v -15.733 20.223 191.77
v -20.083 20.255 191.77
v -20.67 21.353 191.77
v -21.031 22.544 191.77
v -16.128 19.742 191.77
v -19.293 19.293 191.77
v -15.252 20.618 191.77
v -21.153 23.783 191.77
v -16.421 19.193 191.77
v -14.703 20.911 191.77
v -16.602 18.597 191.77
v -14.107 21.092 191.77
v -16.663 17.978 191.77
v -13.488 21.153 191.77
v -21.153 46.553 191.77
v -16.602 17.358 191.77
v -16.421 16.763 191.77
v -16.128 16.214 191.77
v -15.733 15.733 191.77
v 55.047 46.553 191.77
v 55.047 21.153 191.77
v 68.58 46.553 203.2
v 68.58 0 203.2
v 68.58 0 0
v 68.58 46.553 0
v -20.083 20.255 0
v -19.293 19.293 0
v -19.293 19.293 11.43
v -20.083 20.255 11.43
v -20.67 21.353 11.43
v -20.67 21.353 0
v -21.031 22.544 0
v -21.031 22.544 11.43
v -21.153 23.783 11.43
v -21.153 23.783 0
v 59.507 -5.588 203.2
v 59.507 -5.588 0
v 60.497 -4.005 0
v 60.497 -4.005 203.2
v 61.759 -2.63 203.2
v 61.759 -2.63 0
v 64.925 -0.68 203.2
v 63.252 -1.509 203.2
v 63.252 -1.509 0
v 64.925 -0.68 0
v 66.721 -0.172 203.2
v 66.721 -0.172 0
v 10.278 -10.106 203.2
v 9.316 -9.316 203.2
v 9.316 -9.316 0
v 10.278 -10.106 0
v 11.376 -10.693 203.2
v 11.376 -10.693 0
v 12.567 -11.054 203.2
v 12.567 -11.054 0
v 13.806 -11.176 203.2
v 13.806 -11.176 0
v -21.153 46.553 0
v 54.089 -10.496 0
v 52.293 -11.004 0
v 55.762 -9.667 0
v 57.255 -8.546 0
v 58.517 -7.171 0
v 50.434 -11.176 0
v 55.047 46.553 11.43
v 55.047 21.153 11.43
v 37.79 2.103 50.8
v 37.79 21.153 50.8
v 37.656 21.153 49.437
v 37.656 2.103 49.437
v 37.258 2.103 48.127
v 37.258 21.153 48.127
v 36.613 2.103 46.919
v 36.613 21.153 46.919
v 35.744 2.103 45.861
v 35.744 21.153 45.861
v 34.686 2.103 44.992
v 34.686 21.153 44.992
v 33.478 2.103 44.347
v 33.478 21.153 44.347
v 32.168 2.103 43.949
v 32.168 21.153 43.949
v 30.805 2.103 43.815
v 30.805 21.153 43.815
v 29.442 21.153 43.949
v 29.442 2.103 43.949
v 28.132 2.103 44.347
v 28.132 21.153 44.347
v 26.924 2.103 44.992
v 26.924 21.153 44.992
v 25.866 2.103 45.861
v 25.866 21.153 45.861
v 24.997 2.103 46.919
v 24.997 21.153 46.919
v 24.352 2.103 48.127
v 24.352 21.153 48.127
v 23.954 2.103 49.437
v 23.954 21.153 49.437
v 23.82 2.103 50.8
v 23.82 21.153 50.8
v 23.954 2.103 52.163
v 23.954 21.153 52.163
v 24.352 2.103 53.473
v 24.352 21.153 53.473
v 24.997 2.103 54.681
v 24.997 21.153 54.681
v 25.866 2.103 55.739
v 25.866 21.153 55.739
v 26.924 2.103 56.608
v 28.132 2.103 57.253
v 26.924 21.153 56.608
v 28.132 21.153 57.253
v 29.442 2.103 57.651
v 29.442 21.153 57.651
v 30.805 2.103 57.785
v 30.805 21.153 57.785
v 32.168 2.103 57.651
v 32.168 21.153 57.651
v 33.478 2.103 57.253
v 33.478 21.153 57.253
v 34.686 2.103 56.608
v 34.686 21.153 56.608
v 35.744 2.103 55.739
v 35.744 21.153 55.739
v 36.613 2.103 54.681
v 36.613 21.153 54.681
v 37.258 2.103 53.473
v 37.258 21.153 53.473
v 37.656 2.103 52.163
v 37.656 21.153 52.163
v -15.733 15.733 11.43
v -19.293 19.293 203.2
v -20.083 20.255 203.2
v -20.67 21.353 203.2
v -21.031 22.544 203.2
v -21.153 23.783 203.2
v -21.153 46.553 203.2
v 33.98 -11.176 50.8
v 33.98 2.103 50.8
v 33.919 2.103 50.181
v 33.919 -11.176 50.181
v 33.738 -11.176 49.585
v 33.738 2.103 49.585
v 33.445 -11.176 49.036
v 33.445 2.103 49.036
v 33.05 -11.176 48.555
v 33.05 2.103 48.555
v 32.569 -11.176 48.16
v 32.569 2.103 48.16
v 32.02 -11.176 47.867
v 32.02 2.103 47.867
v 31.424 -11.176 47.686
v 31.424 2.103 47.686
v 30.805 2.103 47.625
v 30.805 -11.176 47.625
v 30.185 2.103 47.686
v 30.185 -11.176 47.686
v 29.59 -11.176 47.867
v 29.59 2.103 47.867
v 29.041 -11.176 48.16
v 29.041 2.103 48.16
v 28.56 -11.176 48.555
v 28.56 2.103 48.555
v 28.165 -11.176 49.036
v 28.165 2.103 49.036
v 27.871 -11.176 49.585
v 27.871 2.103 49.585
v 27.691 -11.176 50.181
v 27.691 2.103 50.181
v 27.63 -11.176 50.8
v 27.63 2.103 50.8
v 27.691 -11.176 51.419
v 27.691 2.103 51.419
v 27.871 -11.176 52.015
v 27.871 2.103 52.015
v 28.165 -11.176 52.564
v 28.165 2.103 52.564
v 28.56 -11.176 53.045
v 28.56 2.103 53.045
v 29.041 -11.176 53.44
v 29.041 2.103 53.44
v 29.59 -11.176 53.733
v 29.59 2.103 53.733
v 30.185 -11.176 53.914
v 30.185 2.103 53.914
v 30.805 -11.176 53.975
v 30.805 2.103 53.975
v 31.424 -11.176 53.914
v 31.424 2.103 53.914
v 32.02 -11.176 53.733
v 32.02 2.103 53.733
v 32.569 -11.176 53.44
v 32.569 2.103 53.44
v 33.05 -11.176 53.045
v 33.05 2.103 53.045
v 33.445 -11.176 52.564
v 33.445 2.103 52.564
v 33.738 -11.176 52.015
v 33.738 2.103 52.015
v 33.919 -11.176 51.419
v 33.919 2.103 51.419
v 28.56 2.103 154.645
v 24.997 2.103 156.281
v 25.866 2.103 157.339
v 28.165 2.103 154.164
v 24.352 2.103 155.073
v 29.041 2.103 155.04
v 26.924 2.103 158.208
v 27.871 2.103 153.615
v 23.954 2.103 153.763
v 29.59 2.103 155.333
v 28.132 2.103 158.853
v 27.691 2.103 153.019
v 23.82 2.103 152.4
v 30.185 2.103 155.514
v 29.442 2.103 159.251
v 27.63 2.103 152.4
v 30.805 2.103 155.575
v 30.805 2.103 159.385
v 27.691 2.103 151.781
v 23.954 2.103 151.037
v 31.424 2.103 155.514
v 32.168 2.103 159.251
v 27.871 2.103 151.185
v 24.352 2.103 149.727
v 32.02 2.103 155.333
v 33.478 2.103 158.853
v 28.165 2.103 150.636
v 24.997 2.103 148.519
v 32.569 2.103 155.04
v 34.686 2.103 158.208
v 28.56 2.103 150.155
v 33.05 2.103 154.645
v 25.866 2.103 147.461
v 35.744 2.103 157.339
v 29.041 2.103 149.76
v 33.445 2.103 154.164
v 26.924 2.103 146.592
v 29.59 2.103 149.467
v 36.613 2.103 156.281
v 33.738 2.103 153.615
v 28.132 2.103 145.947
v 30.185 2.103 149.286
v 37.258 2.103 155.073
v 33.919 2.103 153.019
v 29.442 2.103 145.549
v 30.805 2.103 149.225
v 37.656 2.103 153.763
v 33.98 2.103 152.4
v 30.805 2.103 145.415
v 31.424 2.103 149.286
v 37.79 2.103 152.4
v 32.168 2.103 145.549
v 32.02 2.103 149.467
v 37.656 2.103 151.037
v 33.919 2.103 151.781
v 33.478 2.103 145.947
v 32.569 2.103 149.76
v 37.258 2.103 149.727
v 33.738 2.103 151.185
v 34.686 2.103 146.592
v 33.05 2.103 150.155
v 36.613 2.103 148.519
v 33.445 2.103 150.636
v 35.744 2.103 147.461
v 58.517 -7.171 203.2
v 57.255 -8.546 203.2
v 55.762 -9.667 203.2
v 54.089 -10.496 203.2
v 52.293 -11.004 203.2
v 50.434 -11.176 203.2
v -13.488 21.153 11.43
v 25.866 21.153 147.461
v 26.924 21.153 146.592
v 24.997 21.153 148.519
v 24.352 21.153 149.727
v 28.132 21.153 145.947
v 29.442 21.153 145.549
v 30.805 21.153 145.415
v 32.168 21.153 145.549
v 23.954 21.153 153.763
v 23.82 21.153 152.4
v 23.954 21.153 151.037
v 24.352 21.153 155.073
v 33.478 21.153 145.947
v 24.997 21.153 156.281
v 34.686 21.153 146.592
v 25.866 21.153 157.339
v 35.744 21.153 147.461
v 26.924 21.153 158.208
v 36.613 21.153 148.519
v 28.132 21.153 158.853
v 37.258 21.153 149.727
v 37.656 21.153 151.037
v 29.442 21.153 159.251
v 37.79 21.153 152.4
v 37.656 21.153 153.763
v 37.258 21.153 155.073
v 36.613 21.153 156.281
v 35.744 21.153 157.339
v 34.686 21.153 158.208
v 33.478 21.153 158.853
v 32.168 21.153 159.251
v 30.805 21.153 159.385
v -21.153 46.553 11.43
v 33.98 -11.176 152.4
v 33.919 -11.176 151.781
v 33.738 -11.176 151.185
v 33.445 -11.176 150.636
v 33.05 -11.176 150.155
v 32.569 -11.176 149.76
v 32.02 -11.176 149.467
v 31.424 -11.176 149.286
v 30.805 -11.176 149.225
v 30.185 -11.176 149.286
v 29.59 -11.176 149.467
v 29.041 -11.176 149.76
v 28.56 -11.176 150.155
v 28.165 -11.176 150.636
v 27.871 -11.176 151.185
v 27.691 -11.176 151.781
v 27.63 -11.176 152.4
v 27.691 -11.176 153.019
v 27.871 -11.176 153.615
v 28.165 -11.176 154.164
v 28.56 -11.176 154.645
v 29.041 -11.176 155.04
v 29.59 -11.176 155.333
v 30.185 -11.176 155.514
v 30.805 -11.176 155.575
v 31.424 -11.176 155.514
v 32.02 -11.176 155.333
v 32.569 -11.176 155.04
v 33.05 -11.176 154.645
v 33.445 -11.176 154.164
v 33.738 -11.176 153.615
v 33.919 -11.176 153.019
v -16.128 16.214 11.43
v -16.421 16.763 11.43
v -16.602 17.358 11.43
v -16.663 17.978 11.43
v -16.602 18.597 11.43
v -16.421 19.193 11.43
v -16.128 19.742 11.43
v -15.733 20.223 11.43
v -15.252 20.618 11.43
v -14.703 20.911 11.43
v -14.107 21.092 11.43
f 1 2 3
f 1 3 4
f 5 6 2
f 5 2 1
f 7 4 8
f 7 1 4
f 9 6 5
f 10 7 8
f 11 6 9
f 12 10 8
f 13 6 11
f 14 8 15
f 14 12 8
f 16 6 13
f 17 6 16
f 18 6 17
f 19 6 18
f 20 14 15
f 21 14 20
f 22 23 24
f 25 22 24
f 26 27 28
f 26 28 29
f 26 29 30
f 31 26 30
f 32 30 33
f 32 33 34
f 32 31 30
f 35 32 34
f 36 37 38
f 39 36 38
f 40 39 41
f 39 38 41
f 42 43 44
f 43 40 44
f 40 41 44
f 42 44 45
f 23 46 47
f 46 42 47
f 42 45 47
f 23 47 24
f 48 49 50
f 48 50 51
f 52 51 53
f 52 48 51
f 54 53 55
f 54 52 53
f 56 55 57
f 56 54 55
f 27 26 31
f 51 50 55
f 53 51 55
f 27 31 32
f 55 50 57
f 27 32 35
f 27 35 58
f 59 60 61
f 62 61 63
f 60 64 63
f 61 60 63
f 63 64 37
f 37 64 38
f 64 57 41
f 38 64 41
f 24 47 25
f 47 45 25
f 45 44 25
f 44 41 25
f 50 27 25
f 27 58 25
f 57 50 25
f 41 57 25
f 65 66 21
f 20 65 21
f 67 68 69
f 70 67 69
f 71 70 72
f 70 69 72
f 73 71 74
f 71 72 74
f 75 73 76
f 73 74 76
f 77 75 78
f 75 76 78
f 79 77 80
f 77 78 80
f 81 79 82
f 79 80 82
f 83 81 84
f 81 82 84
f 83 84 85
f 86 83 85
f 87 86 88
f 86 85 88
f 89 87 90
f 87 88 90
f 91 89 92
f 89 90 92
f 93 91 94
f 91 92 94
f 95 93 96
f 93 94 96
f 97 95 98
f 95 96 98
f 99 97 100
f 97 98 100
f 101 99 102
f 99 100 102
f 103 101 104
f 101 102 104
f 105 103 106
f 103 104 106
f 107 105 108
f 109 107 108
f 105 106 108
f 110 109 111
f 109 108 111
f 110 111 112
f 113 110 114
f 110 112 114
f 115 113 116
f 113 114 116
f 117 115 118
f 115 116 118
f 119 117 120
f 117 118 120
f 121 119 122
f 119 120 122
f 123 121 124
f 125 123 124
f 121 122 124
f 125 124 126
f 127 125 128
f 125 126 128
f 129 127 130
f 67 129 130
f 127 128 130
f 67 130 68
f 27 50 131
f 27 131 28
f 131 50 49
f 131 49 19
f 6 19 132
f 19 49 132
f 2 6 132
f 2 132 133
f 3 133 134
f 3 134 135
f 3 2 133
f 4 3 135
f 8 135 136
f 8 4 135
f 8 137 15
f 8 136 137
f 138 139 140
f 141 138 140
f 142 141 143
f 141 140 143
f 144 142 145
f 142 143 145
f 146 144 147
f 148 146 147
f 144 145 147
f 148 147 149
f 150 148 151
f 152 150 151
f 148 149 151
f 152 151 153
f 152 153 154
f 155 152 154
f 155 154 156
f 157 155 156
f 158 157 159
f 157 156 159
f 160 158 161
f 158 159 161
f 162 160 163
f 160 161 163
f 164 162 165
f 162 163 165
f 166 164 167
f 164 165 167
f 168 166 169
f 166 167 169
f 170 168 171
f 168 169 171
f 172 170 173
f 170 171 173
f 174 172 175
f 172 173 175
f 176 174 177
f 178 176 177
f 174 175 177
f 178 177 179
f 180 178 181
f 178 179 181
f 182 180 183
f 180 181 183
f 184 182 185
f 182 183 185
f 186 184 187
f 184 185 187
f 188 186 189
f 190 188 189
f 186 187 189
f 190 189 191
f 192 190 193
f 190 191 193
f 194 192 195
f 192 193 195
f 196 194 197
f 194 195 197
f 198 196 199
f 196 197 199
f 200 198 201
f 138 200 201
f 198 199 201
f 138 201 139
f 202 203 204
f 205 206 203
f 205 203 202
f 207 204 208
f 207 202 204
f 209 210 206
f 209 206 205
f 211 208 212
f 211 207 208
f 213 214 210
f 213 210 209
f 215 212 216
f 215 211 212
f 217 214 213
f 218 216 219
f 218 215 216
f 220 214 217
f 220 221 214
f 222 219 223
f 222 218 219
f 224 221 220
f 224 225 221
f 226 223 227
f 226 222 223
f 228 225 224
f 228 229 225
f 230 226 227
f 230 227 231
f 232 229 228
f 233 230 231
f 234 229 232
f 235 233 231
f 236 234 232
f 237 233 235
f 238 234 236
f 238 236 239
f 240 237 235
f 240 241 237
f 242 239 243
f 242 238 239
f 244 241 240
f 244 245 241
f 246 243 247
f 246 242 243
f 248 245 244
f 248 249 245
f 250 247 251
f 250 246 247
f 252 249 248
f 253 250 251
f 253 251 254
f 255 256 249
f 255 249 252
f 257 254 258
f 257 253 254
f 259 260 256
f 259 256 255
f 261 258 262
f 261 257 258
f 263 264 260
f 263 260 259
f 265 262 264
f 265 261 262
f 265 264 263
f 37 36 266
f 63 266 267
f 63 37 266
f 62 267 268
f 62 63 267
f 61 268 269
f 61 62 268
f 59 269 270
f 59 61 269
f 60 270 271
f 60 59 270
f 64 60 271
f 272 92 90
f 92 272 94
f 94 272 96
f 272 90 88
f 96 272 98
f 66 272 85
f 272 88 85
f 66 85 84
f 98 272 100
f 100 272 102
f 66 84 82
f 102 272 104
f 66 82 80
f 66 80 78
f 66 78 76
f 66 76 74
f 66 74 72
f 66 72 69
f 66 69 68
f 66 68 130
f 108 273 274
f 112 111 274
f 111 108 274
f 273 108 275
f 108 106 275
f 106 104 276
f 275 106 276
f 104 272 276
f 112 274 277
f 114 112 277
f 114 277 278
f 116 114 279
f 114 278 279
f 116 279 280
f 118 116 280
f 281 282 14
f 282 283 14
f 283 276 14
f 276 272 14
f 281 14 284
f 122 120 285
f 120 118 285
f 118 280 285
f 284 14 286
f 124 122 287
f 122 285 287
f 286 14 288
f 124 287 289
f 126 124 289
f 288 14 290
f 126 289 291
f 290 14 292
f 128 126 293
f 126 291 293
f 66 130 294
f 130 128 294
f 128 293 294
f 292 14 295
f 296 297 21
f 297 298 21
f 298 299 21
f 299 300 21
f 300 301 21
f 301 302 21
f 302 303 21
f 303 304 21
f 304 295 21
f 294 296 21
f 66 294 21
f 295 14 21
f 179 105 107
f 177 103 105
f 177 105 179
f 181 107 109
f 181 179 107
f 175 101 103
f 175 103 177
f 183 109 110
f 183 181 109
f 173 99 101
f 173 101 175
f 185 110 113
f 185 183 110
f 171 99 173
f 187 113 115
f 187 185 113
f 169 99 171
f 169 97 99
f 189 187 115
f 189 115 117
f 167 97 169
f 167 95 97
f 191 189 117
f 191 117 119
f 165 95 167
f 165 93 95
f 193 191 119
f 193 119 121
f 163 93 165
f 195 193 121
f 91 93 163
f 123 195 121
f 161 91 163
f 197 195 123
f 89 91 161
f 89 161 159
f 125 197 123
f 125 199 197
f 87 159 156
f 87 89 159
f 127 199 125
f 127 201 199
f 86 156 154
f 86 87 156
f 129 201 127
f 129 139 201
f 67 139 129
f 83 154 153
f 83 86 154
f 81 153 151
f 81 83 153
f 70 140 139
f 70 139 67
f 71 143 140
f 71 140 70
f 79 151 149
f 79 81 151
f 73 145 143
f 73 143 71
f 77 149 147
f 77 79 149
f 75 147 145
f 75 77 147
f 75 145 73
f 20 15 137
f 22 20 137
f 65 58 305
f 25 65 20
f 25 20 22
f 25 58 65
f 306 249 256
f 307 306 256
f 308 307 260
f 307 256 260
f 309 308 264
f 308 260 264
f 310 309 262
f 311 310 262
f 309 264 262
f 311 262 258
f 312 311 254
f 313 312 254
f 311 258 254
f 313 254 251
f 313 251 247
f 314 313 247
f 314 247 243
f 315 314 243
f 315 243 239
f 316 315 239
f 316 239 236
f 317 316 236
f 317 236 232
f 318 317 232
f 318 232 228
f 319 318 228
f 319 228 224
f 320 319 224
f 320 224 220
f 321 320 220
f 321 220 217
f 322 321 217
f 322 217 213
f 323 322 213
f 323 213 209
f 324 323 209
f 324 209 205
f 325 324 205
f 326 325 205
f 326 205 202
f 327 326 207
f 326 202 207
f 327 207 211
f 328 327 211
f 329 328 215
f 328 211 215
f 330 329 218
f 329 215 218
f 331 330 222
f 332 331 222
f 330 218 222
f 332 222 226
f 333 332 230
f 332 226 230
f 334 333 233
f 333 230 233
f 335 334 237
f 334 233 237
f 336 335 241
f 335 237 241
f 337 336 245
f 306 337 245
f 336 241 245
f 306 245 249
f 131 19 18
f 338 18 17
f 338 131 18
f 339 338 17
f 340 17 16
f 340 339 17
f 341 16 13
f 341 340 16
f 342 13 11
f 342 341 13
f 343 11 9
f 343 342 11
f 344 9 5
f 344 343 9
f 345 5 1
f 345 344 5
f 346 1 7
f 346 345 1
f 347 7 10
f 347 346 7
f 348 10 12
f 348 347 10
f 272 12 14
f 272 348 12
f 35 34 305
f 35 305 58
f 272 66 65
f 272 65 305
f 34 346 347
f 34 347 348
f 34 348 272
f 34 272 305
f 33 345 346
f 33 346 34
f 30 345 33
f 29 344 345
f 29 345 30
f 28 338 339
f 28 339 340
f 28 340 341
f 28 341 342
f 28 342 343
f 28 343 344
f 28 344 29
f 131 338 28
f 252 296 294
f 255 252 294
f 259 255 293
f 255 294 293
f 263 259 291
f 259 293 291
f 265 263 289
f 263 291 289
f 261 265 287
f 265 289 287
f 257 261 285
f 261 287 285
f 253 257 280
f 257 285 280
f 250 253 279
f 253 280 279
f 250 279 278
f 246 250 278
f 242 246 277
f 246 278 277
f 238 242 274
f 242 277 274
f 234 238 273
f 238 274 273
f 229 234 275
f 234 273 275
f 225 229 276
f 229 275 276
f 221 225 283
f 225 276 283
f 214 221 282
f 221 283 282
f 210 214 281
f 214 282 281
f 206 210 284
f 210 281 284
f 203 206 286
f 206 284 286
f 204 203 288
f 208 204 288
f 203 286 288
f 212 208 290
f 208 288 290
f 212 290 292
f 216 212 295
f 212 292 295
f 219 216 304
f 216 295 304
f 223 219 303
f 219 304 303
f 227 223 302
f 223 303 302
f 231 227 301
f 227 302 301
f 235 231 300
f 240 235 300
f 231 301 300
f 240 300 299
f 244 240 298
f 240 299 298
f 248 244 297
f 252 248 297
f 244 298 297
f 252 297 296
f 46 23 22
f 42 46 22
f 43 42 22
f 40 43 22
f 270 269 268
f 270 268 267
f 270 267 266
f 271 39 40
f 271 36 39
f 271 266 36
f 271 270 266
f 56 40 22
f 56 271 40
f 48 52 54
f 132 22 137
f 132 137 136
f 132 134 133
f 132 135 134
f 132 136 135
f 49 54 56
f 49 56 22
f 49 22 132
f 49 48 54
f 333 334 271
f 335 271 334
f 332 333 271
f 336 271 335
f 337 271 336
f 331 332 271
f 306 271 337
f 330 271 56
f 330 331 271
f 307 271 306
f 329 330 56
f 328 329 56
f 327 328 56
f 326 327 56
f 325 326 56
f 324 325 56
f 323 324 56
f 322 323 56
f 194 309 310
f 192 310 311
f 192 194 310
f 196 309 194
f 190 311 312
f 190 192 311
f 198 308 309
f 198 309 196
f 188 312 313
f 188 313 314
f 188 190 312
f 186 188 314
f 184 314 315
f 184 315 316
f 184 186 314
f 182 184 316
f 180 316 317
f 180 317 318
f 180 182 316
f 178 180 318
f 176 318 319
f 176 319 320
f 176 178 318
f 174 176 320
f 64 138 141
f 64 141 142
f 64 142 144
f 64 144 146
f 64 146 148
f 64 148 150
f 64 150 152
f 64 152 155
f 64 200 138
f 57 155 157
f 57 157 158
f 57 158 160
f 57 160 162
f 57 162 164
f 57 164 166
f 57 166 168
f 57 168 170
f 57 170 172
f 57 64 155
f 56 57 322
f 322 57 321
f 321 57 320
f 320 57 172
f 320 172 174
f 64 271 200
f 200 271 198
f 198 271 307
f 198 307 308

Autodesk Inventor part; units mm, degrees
ref_plane "YZ Plane" through (0, 0, 0) normal (1, 0, 0) x (0, 1, 0)
ref_plane "XZ Plane" through (0, 0, 0) normal (0, 1, 0) x (-1, 0, 0)
ref_plane "XY Plane" through (0, 0, 0) normal (0, 0, 1) x (1, 0, 0)
sketch "Sketch1" plane through (0, 0, 0) normal (0, 0, 1) x (1, 0, 0)
  line L0 (0, 0) -> (58.42, 0)
  line L1 (29.21, 0) -> (29.21, -11.176)
  line L2 (0, 0) -> (29.21, 0)
  line L3 (29.21, 0) -> (29.21, -11.176)
  line L4 (29.21, -11.176) -> (0, -11.176)
  line L5 (0, -11.176) -> (0, 0)
  line L6 (0, -11.176) -> (11.176, -11.176)
  line L7 (11.176, -11.176) -> (0, 0)
  line L8 (59.055, 0) -> (29.21, 0)
  line L9 (29.21, 0) -> (29.21, -11.176)
  line L10 (58.42, 0) -> (29.21, 0)
  line L11 (29.21, 0) -> (29.21, -11.176)
  line L12 (29.21, -11.176) -> (50.4337, -11.176)
  line L13 (58.42, -11.176) -> (58.42, -10.16)
  line L14 (58.42, -11.176) -> (90.1357, -11.176)
  line L15 (90.1357, -11.176) -> (90.1357, 0)
  line L16 (90.1357, 0) -> (68.58, 0)
  line L17 (58.42, 0) -> (58.42, -11.176)
  arc A0 (68.58, 0) -> (59.5068, -5.588) centre (68.58, -10.16) ccw
  arc A1 (50.4337, -11.176) -> (59.5068, -5.588) centre (50.4337, -1.016) ccw
  line L18 (58.42, 0) -> (68.58, 0)
  point P0 (58.42, -7.2964)
  dimension "d1" = 11.176
  dimension "d2" = 11.176
  dimension "d3" = 10.16
  dimension "d6" = 68.58
  dimension "d7" = 10.16
extrude "Extrusion1" add sketch "Sketch1" along normal blind 203.2 contours L0 L1 L4 L7 | L0 L17 A1 L12 L1 | L8 L18 A0 A1 L17
sketch "Sketch2" plane through (0, 0, 203.2) normal (0, 0, 1) x (1, 0, 0)
  line L0 (11.176, -11.176) -> (50.4337, -11.176) projected
  line L1 (11.176, -11.176) -> (-21.1529, 21.1529)
  line L2 (0, 0) -> (11.176, -11.176) projected
  line L3 (-21.1529, 21.1529) -> (68.58, 21.1529)
  arc A0 (68.58, 0) -> (59.5068, -5.588) centre (68.58, -10.16) ccw projected
  line L4 (68.58, 21.1529) -> (68.58, 0)
  arc A1 (57.404, 8.0148) -> (49.5263, -0.5588) centre (68.58, -10.16) ccw
  line L5 (57.404, 8.0148) -> (57.404, 9.9769)
  line L6 (5.8283, 9.9769) -> (19.0786, -3.2734)
  line L7 (31.6162, 9.9769) -> (31.6162, 0)
  line L8 (68.58, 0) -> (0, 0) projected
  line L9 (26.0282, 9.9769) -> (26.0282, 0)
  line L10 (37.2042, 9.9769) -> (37.2042, 0)
  point P0 (15.8053, 0)
  point P1 (26.0282, 0)
  point P2 (37.2042, 0)
  point P3 (49.8184, 0)
  dimension "d9" = 45.72
  dimension "d11" = 5.588
  dimension "d12" = 5.588
extrude "Extrusion2" add sketch "Sketch2" against normal blind 203.2
sketch "Sketch3" plane through (-21.1529, 21.1529, 203.2) normal (0, 1, 0) x (1, 0, 0)
  line L0 (0, 0) -> (0, 203.2) projected
  line L1 (0, 101.6) -> (76.2, 101.6)
  line L2 (76.2, 101.6) -> (76.2, 191.77)
  line L3 (76.2, 191.77) -> (76.2, 11.43)
  line L4 (76.2, 191.77) -> (0, 191.77)
  line L5 (0, 191.77) -> (0, 11.43)
  line L6 (0, 11.43) -> (76.2, 11.43)
  line L7 (76.2, 11.43) -> (76.2, 191.77)
  line L8 (89.7329, 0) -> (0, 0) projected
  line L9 (89.7329, 0) -> (89.7329, 203.2) projected
  line L10 (0, 203.2) -> (89.7329, 203.2) projected
  line L11 (0, 0) -> (0, 203.2) projected
  point P0 (21.1529, 203.2)
  dimension "d15" = 76.2
  dimension "d16" = 90.17
  dimension "d17" = 180.34
extrude "Extrusion3" add sketch "Sketch3" along normal blind 25.4 contours L0 L6 L3 L2 L4 L10 L9 L8
sketch "Sketch4" plane through (-21.1529, 21.1529, 11.43) normal (0, 1, 0) x (1, 0, 0)
  line L0 (32.3289, 11.43) -> (71.5866, 11.43) projected
  line L1 (71.5866, 11.43) -> (71.5866, -191.77) projected
  line L2 (32.3289, -191.77) -> (71.5866, -191.77) projected
  line L3 (32.3289, 11.43) -> (32.3289, -191.77) projected
  line L4 (32.3289, -90.17) -> (71.5866, -90.17)
  line L5 (51.9578, -90.17) -> (51.9578, 11.43)
  line L6 (51.9578, -90.17) -> (51.9578, -191.77)
  circle A0 centre (51.9578, -140.97) radius 6.985
  circle A1 centre (51.9578, -39.37) radius 6.985
  point P0 (21.1529, 11.43)
  dimension "d20" = 13.97
  dimension "d21" = 13.97
extrude "Extrusion4" cut sketch "Sketch4" against normal blind 19.05 contours A1 L5 | L5 A1 | A0 L6 | L6 A0
fillet "Fillet1" radius 3.175 1 edges at (-21.1529, 21.1529, 101.6)
fillet "Fillet2" radius 6.35 2 edges at (-21.1529, 21.1529, 5.715) (-21.1529, 21.1529, 197.485)
fillet "Fillet3" radius 6.35 1 edges at (11.176, -11.176, 101.6)
sketch "Sketch5" plane through (30.8048, 2.1029, 152.4) normal (0, 1, 0) x (1, 0, 0)
  line L0 (-21.4887, -50.8) -> (-21.4887, 152.4) projected
  line L1 (-44.2926, -39.37) -> (-44.2926, 140.97) projected
  line L2 (-44.2926, -39.37) -> (24.2422, -39.37) projected
  line L3 (24.2422, -39.37) -> (24.2422, 140.97) projected
  line L4 (24.2422, 140.97) -> (-44.2926, 140.97) projected
  circle A0 centre (0, 0) radius 6.985 projected
  circle A1 centre (0, 101.6) radius 6.985 projected
  circle A2 centre (0, 101.6) radius 3.175
  circle A3 centre (0, 0) radius 3.175
  point P0 (-30.8048, 152.4)
  dimension "d27" = 6.35
  dimension "d28" = 6.35
extrude "Extrusion5" cut sketch "Sketch5" against normal blind 25.4 contours A2 | A3
properties part number "Battery mount bottom" material "Rubber, Silicone"
